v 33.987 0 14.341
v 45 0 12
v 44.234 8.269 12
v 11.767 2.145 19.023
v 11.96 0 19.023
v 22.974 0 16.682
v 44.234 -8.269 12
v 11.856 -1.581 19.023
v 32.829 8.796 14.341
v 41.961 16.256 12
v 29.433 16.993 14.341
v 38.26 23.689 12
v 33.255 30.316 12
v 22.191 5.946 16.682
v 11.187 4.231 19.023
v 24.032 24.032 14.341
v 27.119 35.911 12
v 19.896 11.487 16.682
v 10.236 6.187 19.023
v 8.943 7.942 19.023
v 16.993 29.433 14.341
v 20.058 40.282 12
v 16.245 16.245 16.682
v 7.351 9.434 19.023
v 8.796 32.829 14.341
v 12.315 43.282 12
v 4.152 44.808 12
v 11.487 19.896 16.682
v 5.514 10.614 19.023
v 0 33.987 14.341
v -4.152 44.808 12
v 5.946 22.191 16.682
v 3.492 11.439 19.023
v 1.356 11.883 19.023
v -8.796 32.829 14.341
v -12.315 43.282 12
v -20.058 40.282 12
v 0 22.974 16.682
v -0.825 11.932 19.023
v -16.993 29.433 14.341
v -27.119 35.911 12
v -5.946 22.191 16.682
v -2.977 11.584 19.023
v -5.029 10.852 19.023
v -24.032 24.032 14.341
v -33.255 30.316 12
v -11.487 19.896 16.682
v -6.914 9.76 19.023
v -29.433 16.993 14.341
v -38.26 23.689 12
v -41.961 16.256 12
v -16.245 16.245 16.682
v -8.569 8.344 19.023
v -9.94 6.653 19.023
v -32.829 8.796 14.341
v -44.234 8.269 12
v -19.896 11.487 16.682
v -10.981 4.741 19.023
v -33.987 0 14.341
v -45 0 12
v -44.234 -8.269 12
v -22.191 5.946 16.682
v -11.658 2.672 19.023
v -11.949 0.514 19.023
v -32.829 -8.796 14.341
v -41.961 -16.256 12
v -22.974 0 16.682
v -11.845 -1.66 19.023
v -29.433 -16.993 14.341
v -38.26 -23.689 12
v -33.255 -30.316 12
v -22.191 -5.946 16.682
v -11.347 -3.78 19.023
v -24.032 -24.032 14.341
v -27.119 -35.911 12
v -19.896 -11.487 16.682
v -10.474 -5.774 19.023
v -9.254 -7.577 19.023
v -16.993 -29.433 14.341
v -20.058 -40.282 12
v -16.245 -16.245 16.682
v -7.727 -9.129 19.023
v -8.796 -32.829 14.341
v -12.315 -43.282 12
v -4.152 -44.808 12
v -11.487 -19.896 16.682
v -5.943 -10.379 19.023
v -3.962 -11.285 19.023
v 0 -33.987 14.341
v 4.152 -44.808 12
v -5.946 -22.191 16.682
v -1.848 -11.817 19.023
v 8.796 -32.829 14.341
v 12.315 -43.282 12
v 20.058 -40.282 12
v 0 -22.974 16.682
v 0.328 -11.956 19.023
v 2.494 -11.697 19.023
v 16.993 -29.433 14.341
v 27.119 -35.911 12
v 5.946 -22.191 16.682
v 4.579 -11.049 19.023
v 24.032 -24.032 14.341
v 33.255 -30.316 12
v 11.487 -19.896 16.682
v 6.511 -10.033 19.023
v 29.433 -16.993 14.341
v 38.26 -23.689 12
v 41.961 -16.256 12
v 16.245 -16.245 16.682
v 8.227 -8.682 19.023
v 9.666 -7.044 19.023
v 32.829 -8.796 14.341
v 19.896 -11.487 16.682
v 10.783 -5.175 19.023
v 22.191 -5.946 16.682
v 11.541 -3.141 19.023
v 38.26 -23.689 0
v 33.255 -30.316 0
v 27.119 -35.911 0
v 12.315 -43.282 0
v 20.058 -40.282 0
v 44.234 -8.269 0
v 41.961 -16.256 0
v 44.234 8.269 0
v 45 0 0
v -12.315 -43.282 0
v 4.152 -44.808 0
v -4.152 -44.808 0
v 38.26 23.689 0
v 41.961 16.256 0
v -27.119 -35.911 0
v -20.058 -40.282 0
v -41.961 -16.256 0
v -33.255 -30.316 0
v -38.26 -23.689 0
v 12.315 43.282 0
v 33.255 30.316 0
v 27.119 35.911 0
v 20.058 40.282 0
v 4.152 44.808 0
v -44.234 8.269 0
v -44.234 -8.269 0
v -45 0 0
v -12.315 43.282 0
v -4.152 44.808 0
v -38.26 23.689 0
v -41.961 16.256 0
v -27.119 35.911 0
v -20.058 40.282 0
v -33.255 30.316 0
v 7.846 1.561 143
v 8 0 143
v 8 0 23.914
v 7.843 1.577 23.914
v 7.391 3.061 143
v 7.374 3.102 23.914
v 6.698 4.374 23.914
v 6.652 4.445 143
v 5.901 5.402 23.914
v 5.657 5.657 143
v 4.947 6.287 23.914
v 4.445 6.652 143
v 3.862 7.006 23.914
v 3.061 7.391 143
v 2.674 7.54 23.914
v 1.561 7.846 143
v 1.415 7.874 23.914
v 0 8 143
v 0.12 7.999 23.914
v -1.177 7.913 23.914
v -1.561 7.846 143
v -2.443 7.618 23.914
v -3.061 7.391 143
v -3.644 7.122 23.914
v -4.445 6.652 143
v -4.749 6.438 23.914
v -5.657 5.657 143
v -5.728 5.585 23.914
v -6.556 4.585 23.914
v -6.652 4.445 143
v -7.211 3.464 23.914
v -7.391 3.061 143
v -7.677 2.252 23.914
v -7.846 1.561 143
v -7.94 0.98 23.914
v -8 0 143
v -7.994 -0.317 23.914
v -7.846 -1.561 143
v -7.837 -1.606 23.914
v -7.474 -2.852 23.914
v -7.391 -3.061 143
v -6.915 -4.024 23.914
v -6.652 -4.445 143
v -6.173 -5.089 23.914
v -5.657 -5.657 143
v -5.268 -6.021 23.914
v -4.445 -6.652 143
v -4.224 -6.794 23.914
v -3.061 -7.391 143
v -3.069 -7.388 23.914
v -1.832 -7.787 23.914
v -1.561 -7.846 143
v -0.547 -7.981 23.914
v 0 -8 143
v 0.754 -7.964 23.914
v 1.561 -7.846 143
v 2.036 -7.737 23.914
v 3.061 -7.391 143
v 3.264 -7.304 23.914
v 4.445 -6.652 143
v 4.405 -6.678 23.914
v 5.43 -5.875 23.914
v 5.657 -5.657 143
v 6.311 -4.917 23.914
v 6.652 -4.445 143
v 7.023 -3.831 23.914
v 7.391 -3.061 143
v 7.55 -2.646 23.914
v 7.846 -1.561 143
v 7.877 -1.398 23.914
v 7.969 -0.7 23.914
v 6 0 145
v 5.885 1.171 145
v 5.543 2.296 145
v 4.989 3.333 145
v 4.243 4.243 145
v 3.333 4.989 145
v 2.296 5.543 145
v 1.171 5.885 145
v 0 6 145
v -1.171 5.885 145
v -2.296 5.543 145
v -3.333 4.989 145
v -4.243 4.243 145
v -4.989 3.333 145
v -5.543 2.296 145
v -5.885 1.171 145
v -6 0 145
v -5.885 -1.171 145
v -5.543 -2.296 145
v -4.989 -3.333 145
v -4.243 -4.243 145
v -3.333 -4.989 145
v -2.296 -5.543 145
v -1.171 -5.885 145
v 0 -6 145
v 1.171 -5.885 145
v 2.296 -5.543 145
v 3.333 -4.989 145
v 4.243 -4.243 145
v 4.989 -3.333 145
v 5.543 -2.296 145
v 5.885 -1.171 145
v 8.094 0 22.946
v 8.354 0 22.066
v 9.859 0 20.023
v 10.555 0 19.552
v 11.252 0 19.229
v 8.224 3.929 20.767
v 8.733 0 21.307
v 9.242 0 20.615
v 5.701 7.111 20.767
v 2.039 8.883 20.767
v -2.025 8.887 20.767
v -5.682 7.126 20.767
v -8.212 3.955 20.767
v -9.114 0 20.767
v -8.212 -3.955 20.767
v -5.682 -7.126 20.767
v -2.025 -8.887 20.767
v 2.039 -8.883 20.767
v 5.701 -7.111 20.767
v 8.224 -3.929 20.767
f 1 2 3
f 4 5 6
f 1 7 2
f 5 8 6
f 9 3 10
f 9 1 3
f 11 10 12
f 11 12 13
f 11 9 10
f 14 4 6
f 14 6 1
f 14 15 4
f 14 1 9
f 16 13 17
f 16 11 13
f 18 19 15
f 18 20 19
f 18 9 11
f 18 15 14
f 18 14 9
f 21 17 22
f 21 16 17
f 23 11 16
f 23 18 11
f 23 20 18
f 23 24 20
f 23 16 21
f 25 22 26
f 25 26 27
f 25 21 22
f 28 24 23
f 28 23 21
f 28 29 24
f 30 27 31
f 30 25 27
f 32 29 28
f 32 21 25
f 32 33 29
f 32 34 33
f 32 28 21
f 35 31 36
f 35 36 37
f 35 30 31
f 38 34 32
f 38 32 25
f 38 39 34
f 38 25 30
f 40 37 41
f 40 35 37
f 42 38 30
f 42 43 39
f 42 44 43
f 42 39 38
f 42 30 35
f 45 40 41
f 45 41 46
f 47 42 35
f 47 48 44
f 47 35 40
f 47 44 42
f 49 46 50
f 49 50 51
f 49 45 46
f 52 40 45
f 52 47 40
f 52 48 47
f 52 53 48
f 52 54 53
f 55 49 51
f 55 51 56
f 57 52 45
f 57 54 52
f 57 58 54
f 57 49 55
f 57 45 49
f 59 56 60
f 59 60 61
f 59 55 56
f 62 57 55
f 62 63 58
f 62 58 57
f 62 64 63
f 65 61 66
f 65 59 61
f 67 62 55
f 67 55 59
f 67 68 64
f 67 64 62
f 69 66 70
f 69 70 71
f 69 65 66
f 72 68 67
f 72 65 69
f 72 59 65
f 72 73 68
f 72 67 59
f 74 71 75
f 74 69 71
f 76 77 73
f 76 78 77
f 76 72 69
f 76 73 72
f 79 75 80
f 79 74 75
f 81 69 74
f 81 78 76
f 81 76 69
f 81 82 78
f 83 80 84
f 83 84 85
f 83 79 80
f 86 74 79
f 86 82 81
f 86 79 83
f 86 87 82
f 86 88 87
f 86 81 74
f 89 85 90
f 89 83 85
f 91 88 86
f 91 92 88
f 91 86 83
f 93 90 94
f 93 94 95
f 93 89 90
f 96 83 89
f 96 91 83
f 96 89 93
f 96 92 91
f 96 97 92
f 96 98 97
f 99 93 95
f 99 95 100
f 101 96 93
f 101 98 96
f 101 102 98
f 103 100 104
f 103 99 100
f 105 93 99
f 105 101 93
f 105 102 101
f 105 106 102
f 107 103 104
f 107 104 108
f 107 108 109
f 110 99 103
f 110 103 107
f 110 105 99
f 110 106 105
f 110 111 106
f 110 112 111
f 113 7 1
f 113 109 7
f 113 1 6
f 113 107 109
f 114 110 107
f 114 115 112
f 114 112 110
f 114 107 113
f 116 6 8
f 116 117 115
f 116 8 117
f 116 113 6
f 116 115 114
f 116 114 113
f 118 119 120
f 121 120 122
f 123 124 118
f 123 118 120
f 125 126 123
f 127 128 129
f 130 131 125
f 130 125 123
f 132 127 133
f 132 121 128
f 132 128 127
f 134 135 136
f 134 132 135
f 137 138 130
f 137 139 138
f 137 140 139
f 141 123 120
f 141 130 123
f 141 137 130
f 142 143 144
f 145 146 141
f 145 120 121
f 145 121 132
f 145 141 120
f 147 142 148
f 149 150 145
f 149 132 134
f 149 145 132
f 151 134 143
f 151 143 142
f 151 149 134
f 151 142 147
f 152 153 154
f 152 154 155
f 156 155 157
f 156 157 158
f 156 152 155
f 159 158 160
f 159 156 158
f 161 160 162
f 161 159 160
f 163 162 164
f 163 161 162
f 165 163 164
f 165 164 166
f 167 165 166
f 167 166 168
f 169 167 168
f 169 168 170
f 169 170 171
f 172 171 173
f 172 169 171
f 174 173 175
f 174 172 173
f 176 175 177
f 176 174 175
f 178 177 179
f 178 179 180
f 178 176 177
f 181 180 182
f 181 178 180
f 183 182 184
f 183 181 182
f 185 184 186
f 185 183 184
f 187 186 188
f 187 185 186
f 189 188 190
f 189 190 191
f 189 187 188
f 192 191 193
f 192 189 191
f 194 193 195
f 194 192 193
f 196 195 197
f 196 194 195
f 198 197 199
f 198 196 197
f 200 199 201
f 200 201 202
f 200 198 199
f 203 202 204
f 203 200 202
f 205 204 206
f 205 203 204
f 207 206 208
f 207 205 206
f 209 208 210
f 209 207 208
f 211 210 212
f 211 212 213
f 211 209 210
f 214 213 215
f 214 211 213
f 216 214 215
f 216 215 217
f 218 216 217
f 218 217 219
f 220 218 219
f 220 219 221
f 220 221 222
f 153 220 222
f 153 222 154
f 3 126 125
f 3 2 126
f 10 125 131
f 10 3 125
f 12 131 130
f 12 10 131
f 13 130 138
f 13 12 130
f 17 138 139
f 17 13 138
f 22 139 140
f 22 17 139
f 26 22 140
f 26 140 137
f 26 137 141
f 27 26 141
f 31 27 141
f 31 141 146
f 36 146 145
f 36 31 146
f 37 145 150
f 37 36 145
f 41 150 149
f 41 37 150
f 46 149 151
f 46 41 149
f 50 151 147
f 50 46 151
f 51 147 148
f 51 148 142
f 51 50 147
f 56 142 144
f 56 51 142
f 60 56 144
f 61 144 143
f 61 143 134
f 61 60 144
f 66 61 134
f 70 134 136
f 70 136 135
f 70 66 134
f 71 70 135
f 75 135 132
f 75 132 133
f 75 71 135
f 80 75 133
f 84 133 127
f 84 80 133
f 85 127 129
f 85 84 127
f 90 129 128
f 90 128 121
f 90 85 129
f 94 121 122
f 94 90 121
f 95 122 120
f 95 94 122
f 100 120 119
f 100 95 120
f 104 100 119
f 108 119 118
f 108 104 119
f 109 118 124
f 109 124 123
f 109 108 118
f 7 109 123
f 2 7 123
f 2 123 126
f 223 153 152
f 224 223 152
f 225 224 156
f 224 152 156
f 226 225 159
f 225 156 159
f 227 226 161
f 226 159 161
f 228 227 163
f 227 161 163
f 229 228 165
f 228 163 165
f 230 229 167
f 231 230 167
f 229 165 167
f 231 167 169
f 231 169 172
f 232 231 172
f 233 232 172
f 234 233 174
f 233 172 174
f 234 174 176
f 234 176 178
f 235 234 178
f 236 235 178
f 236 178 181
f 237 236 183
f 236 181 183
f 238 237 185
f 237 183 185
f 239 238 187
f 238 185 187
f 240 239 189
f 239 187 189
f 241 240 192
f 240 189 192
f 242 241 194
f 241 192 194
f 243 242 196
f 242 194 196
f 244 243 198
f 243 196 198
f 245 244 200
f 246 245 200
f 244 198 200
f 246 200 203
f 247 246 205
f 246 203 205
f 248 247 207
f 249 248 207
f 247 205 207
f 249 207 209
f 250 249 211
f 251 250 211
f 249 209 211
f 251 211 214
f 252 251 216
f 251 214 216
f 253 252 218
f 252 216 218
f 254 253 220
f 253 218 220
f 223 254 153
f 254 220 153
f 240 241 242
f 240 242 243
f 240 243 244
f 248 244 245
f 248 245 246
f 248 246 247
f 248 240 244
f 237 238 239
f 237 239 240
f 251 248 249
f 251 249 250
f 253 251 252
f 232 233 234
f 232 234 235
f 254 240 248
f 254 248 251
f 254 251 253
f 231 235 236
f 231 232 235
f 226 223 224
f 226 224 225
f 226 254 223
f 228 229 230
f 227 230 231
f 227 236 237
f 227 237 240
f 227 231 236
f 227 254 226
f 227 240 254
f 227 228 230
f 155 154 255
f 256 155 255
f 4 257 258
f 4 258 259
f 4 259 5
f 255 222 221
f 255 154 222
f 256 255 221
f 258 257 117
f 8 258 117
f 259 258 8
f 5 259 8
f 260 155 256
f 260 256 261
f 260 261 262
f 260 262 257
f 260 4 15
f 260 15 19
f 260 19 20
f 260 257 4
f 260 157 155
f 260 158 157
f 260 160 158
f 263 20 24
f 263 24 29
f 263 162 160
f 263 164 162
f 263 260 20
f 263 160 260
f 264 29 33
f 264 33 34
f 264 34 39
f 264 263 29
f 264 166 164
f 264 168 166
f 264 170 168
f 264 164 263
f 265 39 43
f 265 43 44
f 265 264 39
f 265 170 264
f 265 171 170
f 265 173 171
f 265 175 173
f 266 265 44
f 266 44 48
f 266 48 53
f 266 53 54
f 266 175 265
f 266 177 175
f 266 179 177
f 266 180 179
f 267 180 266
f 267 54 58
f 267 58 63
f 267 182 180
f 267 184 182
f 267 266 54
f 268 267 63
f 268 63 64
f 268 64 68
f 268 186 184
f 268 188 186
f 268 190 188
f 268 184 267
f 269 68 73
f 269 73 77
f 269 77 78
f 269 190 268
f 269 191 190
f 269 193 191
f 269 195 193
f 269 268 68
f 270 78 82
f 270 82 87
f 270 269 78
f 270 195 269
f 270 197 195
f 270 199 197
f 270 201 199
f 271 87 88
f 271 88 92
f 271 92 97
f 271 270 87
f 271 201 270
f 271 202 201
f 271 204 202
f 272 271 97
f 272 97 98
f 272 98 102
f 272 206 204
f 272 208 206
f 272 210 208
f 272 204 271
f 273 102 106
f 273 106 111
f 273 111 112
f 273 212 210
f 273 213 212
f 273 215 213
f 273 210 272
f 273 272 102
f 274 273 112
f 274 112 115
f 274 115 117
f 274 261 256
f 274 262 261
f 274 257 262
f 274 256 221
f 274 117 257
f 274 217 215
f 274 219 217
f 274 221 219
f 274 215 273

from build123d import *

# Parameters (mm, degrees)
F2_SIZE = 2
F3_R    = 5


with BuildPart() as f1:
    # F0 (on Front) → F1 (revolve)
    with BuildSketch(Plane.XZ):
        Polygon((8, 145), (0, 145), (0, 0), (45, 0), (45, 12), (8, 19.864593), align=None)
    revolve(axis=Axis((0, 0, 72.5), (0, 0, 1)))

    # F2
    f2_edges = [f1.edges().sort_by_distance(p)[0] for p in [
        (-8, 0, 145),
    ]]
    chamfer(f2_edges, length=F2_SIZE)

    # F3
    f3_edges = [f1.edges().sort_by_distance(p)[0] for p in [
        (-8, 0, 19.864593),
    ]]
    fillet(f3_edges, radius=F3_R)


solid = f1.part
